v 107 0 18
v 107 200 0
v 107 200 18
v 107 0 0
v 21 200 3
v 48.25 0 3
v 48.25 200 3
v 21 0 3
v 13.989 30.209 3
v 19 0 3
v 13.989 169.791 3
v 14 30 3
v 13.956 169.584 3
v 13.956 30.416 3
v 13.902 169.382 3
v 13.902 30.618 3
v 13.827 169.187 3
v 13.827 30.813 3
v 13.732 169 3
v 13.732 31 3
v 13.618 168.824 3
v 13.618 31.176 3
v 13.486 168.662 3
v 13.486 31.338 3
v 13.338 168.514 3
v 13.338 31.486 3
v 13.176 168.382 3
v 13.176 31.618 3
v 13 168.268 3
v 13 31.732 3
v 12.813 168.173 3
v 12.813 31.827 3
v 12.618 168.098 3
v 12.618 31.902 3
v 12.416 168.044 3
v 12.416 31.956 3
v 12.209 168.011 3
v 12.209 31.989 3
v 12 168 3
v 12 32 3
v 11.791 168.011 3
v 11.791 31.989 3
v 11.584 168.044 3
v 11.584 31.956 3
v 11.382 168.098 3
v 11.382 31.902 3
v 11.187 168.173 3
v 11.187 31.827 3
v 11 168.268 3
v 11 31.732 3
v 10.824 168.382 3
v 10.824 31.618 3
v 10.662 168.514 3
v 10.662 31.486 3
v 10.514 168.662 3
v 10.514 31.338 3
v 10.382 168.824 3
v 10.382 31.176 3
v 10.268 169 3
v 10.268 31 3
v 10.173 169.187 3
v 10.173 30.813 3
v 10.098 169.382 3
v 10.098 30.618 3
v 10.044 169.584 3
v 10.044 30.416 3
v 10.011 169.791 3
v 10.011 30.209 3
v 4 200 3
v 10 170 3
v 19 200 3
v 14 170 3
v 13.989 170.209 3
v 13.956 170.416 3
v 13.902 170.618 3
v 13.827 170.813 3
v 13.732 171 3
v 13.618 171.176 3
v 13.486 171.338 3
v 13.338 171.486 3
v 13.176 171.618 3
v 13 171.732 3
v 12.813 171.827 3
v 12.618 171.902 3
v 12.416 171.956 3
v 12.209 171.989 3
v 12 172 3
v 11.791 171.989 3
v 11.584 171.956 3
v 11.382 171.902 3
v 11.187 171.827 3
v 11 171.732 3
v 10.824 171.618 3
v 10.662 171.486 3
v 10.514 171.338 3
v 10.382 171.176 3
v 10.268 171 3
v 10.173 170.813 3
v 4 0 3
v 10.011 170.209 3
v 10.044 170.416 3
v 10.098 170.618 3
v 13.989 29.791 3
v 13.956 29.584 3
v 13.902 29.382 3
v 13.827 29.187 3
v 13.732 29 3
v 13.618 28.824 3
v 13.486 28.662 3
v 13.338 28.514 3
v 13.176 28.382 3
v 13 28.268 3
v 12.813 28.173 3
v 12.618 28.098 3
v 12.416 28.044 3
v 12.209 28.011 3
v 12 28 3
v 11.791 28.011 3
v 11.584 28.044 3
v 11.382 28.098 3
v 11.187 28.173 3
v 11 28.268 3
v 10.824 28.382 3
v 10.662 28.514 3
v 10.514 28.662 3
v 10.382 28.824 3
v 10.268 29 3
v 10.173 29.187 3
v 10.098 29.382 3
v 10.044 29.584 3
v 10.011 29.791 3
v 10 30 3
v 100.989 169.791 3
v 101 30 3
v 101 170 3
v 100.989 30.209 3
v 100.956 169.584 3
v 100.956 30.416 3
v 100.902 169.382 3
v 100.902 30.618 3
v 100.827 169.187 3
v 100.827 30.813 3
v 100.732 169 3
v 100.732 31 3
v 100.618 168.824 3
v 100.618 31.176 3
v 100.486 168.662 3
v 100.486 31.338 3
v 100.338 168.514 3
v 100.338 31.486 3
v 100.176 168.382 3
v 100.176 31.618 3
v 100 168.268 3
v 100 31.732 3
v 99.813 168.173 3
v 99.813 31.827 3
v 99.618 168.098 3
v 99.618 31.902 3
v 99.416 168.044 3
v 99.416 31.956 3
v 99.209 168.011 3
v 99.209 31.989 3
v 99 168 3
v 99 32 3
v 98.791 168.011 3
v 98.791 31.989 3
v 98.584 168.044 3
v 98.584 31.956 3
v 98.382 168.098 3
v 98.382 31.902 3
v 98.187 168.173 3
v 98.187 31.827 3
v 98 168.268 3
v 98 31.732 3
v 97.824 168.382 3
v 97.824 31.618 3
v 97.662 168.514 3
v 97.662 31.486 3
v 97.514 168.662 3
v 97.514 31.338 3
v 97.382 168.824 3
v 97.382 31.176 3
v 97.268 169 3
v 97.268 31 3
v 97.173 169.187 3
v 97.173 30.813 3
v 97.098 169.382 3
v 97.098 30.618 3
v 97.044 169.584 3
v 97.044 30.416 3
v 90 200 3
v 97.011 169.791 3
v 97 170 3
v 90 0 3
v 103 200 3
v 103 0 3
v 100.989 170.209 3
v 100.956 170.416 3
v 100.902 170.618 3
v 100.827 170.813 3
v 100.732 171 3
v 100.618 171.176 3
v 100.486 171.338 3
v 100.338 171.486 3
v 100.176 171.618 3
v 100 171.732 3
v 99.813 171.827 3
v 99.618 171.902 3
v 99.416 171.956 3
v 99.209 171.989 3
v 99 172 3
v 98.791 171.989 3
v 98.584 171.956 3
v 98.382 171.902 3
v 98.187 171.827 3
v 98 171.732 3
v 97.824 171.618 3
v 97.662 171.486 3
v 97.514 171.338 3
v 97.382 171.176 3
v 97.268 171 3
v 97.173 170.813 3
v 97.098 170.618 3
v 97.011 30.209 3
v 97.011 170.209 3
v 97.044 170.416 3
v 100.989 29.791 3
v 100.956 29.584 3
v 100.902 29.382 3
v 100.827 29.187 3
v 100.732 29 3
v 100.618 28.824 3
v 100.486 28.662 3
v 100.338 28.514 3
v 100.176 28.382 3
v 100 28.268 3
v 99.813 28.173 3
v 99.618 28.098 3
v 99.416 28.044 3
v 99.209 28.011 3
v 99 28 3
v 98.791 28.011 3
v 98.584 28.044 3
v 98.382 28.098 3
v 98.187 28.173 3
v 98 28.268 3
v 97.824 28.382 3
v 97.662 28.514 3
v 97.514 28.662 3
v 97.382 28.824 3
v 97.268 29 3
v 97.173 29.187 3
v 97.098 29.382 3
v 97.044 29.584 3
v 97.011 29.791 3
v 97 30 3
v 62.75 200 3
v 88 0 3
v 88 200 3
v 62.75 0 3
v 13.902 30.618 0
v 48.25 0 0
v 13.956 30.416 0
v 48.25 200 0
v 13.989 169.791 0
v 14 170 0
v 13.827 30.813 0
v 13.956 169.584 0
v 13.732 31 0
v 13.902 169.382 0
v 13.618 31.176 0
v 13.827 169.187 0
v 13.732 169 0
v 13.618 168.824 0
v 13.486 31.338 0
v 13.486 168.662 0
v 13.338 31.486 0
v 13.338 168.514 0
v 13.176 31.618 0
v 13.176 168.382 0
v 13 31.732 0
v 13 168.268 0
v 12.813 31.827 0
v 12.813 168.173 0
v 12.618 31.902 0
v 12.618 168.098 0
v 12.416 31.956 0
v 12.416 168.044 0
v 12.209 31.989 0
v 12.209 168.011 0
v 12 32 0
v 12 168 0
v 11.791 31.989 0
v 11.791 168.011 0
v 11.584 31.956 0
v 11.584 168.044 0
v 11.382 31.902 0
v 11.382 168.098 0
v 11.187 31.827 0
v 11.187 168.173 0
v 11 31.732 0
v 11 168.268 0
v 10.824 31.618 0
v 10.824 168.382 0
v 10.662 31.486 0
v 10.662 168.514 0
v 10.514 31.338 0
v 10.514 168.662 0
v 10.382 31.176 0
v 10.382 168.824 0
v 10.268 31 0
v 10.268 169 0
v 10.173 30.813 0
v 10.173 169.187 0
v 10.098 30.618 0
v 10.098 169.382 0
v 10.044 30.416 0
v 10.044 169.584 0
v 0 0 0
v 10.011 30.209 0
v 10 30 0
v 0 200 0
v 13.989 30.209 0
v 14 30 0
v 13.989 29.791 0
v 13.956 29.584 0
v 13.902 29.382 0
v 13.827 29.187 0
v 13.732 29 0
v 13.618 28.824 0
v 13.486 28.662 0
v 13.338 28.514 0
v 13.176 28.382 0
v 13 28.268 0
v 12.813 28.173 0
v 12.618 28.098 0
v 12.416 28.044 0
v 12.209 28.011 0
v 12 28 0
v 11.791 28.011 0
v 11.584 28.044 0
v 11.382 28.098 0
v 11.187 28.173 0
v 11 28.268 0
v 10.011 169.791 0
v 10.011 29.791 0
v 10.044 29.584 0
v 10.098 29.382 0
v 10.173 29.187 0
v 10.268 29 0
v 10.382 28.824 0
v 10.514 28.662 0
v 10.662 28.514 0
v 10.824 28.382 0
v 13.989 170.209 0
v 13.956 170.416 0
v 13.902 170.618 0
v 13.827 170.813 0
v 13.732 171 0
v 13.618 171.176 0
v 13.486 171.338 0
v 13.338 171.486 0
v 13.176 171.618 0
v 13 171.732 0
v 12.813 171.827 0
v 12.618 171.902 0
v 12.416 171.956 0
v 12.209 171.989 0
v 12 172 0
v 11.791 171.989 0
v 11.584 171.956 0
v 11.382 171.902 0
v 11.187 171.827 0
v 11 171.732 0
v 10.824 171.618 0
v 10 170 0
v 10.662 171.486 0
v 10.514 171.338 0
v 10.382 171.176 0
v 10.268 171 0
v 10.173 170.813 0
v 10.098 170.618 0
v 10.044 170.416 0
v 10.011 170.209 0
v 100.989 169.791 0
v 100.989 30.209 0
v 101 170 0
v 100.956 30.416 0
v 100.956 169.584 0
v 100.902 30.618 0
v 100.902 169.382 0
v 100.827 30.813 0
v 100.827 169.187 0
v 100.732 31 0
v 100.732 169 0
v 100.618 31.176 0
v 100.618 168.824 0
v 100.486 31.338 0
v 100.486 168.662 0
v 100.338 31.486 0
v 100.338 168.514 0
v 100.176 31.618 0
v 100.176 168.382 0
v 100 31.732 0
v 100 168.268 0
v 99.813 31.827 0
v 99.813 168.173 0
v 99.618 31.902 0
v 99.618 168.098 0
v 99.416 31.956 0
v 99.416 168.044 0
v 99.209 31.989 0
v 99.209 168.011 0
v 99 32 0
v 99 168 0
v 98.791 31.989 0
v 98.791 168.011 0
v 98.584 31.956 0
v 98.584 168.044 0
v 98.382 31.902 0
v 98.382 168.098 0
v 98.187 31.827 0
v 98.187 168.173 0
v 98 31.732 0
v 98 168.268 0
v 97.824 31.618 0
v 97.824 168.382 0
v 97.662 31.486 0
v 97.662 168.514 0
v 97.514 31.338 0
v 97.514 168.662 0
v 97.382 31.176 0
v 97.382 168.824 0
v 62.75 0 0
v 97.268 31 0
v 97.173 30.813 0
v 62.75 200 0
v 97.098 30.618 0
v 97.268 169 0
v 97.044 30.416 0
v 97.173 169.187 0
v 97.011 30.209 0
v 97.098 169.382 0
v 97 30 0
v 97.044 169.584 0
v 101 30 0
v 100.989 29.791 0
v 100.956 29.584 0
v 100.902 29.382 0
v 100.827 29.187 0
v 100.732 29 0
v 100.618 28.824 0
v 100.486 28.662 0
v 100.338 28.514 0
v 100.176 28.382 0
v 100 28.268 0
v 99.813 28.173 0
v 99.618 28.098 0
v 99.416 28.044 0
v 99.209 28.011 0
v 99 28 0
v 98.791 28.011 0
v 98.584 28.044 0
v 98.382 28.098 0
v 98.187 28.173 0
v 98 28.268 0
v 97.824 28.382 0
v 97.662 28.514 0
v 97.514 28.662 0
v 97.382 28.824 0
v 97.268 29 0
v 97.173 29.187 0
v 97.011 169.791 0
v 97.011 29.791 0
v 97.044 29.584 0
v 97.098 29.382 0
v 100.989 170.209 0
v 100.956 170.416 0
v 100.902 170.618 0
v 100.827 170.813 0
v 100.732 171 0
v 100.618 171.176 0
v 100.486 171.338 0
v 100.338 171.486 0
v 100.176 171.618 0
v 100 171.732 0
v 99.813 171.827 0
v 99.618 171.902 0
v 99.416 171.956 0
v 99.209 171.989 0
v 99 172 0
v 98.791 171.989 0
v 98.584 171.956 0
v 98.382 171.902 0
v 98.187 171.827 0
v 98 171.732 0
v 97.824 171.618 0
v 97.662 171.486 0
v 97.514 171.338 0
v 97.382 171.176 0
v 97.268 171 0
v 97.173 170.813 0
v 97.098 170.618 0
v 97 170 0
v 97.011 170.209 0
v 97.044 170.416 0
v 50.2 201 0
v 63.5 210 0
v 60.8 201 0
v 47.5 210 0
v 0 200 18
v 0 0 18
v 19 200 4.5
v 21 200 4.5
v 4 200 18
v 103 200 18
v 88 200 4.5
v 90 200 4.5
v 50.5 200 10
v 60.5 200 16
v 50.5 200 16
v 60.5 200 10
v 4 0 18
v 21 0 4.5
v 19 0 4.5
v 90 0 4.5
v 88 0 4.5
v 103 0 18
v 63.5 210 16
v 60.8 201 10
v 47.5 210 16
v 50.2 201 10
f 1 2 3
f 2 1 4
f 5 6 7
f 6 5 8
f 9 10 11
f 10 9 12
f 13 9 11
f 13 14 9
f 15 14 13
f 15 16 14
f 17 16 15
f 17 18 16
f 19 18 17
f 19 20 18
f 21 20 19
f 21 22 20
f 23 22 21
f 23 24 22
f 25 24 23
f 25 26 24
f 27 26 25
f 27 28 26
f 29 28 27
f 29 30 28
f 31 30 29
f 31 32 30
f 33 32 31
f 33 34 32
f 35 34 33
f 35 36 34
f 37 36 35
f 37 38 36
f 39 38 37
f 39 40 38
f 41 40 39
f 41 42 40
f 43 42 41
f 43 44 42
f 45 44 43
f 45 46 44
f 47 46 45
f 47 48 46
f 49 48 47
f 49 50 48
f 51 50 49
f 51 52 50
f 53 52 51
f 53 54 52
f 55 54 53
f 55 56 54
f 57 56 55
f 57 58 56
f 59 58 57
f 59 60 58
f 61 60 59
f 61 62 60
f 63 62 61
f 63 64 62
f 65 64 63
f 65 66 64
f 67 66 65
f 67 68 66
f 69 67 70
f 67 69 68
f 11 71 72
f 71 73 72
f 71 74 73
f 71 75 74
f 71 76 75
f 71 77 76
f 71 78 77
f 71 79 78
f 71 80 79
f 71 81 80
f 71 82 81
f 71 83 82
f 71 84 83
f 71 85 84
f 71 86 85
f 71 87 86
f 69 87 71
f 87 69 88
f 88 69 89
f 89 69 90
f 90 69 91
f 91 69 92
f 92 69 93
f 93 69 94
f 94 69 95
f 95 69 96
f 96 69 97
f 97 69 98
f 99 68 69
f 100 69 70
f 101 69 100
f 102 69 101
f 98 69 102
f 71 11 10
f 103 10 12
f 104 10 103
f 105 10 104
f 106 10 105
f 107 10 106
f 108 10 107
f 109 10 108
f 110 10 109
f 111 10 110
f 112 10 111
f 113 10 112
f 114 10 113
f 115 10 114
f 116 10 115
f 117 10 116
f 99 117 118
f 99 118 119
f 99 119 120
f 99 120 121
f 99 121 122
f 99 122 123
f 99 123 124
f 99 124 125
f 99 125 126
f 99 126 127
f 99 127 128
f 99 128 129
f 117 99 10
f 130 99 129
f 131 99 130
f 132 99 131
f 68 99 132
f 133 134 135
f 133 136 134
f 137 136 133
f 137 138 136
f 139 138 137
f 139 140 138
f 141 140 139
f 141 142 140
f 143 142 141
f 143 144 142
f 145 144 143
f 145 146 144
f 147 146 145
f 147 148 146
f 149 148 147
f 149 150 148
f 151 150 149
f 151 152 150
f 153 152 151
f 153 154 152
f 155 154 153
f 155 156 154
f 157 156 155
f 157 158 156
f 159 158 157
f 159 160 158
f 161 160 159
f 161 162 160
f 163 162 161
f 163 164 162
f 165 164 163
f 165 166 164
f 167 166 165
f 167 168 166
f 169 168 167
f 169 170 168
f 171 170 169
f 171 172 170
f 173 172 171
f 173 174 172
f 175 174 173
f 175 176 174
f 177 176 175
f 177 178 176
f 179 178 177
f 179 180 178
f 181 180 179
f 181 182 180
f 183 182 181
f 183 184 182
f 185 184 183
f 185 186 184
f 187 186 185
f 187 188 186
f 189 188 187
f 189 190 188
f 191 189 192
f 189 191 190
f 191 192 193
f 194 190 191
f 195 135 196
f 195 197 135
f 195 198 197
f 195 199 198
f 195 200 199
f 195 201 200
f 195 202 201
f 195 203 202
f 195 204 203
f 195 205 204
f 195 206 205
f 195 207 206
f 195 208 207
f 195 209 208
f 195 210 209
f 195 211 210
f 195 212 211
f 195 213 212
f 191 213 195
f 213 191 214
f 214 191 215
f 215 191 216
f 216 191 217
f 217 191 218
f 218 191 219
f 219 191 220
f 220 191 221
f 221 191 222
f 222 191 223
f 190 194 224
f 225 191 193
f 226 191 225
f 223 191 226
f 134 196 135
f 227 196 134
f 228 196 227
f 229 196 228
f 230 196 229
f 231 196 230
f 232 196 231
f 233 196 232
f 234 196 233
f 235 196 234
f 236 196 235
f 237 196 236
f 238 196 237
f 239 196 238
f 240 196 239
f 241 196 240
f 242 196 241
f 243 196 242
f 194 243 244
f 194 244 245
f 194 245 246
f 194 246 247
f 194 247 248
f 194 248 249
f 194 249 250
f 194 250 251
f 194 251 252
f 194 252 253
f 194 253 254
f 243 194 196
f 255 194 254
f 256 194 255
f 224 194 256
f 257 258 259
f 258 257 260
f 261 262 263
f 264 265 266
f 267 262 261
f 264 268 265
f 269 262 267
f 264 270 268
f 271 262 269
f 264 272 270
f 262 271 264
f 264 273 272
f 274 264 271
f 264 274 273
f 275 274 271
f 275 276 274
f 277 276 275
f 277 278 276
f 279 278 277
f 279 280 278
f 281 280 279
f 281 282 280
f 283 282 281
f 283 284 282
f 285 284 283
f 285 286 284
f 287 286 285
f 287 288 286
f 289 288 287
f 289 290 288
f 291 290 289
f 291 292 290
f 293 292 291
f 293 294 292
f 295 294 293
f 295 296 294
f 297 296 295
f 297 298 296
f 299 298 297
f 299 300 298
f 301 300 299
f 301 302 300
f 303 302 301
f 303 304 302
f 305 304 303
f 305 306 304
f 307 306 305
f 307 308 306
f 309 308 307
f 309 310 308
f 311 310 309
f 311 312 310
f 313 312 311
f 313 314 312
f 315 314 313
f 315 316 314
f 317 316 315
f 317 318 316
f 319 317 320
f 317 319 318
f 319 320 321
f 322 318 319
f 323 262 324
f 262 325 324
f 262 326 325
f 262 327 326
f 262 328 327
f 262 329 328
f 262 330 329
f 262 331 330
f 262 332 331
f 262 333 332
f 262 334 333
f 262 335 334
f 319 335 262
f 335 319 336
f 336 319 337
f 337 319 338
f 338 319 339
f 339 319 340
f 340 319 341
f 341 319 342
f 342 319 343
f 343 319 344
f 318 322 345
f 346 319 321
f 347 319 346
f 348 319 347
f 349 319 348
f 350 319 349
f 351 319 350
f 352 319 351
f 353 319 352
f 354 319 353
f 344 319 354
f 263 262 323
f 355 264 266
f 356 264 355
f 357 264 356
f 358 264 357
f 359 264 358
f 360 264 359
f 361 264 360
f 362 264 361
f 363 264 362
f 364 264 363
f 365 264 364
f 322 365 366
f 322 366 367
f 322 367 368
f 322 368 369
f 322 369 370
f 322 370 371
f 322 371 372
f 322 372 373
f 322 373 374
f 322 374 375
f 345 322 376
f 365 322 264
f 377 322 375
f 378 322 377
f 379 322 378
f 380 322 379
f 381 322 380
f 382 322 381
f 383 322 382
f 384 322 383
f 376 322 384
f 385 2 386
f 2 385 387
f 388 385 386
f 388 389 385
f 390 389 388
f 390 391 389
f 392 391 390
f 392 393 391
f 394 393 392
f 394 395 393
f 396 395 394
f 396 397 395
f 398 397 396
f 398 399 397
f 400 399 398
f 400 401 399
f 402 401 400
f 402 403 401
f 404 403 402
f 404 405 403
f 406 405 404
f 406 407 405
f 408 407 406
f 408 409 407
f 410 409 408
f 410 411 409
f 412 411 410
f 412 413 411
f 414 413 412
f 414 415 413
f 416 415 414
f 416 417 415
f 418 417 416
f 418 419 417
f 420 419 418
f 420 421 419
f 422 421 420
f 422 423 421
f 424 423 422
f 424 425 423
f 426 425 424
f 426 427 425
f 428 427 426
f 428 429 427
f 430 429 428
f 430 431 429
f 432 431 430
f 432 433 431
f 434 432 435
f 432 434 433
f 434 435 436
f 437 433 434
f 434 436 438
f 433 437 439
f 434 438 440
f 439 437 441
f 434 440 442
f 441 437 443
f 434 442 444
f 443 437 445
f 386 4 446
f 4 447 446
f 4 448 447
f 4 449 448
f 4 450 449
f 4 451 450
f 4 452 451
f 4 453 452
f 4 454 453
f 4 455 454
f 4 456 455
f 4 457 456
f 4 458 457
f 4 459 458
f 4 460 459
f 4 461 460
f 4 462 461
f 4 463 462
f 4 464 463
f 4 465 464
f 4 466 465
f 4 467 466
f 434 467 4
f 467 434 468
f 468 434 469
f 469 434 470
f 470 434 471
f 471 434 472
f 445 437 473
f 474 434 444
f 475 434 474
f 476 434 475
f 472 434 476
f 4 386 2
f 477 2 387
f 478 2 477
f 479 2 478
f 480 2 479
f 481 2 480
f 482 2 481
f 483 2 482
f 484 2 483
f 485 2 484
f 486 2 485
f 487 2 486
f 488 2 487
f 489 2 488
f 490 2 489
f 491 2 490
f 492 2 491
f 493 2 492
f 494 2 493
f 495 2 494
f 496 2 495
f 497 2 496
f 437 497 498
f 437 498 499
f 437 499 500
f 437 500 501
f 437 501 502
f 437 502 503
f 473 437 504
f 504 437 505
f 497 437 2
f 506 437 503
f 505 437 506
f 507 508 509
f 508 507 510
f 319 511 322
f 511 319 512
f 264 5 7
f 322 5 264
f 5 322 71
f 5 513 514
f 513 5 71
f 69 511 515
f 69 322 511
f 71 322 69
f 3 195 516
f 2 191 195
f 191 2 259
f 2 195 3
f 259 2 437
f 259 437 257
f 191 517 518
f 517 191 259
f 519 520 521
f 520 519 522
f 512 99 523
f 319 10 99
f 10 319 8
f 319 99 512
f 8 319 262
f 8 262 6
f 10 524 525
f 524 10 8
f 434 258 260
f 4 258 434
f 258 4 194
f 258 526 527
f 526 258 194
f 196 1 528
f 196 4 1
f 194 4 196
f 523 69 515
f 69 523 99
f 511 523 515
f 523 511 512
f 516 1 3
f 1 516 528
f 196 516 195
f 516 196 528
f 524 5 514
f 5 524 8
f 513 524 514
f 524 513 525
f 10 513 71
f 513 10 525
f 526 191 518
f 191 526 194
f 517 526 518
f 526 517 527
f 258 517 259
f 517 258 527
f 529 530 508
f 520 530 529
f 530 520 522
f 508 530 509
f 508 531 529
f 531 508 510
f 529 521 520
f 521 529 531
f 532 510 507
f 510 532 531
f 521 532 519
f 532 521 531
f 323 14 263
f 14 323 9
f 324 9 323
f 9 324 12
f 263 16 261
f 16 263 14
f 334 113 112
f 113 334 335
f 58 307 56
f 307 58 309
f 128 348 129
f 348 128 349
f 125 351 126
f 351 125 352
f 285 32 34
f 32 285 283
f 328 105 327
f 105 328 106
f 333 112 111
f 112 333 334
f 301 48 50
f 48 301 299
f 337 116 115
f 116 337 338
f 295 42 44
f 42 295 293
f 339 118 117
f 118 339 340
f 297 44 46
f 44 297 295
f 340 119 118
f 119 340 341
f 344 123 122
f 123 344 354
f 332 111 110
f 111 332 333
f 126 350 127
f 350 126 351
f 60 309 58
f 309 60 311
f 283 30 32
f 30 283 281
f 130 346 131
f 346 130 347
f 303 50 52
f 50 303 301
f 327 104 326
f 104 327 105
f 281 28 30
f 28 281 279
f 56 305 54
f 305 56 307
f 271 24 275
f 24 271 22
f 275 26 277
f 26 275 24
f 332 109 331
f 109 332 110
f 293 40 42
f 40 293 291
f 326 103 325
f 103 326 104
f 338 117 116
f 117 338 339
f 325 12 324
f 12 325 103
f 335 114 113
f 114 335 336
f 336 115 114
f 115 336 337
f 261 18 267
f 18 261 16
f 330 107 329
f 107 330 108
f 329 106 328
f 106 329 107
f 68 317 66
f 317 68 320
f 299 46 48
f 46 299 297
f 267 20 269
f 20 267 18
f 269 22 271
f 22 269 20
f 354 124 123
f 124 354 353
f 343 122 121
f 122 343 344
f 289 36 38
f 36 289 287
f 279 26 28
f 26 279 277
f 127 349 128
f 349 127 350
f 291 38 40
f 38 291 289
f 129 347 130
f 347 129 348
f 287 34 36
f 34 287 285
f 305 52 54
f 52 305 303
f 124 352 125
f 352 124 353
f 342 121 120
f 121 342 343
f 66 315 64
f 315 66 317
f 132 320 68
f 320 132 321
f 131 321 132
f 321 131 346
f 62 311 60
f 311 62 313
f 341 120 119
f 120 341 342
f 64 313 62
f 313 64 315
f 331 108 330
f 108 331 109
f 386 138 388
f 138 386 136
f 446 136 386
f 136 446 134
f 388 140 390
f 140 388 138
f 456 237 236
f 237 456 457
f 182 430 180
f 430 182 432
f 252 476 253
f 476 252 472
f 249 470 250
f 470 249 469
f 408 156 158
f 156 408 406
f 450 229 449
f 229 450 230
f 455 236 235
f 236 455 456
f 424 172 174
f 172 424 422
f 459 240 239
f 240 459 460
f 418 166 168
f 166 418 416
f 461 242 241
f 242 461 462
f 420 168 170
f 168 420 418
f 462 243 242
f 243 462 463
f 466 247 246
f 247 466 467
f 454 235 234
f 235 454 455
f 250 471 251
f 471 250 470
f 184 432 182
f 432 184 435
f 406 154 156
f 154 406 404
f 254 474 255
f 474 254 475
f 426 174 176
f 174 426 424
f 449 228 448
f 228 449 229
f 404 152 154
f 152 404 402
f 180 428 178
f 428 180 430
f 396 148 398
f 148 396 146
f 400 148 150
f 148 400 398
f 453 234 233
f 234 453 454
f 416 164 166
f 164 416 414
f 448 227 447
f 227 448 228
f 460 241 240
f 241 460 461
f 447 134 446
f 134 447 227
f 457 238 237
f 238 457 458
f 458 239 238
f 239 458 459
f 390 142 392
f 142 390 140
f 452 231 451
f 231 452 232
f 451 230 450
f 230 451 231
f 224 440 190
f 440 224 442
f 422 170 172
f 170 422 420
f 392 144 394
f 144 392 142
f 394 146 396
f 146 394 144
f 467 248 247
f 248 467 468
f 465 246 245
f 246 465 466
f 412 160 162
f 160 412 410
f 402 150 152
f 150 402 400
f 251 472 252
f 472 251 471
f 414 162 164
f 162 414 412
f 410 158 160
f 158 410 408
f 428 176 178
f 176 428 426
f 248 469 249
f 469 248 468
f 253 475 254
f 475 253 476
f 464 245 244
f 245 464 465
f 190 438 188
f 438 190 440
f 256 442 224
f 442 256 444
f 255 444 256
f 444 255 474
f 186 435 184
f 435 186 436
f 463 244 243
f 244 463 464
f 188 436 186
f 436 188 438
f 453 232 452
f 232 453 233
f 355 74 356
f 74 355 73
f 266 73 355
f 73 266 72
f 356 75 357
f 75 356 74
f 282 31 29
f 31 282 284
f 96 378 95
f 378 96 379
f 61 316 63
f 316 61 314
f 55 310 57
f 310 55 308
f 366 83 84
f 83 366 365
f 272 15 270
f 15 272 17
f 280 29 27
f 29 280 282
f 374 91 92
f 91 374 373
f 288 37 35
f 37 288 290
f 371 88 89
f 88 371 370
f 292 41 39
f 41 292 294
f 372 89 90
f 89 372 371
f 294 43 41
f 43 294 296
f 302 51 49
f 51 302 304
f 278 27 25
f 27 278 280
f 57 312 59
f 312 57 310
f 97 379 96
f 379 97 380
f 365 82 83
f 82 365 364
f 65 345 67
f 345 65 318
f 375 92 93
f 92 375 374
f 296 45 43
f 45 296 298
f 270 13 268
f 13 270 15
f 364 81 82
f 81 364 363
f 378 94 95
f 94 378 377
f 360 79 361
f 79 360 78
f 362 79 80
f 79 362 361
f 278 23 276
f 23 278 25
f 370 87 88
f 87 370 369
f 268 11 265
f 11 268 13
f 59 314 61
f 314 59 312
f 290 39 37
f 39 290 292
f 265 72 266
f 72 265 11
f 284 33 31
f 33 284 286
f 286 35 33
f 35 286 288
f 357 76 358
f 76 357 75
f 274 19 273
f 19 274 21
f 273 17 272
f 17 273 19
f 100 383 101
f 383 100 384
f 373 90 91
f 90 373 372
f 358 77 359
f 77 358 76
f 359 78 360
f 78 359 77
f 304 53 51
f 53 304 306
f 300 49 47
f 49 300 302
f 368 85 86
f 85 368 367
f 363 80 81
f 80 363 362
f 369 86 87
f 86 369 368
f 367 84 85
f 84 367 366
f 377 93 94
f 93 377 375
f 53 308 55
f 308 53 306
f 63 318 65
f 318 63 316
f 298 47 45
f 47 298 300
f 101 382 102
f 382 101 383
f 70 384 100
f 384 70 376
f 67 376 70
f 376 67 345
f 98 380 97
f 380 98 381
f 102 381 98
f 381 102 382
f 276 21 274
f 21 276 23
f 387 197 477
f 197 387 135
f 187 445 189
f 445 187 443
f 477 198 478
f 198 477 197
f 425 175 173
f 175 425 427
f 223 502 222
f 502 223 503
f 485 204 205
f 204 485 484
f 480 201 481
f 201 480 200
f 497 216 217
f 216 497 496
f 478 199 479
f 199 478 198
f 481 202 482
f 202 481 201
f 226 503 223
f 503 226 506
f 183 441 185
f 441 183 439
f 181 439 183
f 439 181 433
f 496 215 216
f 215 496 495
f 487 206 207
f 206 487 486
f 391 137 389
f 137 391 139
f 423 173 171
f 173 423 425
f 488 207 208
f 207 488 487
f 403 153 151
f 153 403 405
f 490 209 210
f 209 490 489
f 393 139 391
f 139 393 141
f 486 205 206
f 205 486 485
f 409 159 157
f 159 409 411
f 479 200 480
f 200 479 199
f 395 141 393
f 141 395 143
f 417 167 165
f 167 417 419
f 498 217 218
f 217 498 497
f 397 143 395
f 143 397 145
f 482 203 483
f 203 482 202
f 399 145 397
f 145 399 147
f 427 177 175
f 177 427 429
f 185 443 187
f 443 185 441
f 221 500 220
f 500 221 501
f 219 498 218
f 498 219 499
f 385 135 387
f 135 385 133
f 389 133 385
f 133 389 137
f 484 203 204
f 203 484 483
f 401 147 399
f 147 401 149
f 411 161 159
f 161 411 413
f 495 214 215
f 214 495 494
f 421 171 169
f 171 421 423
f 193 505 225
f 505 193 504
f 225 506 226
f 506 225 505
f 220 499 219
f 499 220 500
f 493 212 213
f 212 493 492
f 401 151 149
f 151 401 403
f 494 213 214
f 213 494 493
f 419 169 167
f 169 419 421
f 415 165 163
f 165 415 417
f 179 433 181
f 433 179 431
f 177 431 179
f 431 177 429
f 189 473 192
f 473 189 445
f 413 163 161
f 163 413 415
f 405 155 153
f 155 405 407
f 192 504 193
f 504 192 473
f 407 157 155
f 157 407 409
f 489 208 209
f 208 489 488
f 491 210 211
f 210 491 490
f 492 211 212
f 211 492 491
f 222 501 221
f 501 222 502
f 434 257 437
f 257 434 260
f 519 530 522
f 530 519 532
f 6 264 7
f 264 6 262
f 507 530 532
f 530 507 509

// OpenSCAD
// ====================================================================
// SUSHI CONVEYOR - MODULAR STRAIGHT TRACK SEGMENT
// Designed for Prusa CORE One+ (Fits 250x220mm Bed Flat Without Supports)
//
// Features:
// - Two low-friction sliding rails to minimize motor strain.
// - Center hinge guide slot (14mm wide).
// - Interlocking dovetail ends for snap-together tool-less assembly.
// - Split-lane side joints with central utility channel (for LEDs/wires).
// ====================================================================

$fn = 60;

// --------------------------------------------------
// TRACK PARAMETERS
// --------------------------------------------------
segment_length = 200.0; // 200mm length fits standard bed
slat_width     = 100.0; // Slat width
lane_clearance = 3.0;   // 1.5mm gap on each side
channel_width  = slat_width + lane_clearance; // 103mm

track_base_th  = 3.0;   // Floor thickness
side_wall_th   = 4.0;   // Outer wall thickness
side_wall_h    = 18.0;  // Outer guard wall height
slot_width     = 14.5;  // Center slot width for hinge lugs
slot_depth     = 11.0;  // Center slot depth

dovetail_w     = 16.0;  // Interlocking dovetail width
dovetail_neck  = 10.0;  // Dovetail neck width
dovetail_h     = 10.0;  // Dovetail length
dovetail_clr   = 0.25;  // 0.25mm slip-fit clearance for 3D printing

// --------------------------------------------------
// DOVETAIL TAB MODULE
// --------------------------------------------------
module dovetail_tab(clr = 0.0) {
    linear_extrude(height = side_wall_h - 2) {
        polygon(points=[
            [-dovetail_neck/2 + clr, 0],
            [-dovetail_w/2 + clr, dovetail_h - clr],
            [dovetail_w/2 - clr, dovetail_h - clr],
            [dovetail_neck/2 - clr, 0]
        ]);
    }
}

// --------------------------------------------------
// SINGLE STRAIGHT LANE MODULE (LEFT OR RIGHT)
// --------------------------------------------------
module straight_lane_half(is_left = true) {
    difference() {
        union() {
            // Main floor and outer wall body
            cube([channel_width + side_wall_th, segment_length, track_base_th]);
            
            // Outer guide wall
            translate([0, 0, 0])
                cube([side_wall_th, segment_length, side_wall_h]);
            
            // Inner guide wall (dividing island edge)
            translate([channel_width, 0, 0])
                cube([side_wall_th, segment_length, side_wall_h]);
            
            // Raised low-friction glide ribs (Slats ride on these two thin ridges)
            translate([side_wall_th + 15, 0, track_base_th])
                cube([2.0, segment_length, 1.5]);
            translate([channel_width - 15, 0, track_base_th])
                cube([2.0, segment_length, 1.5]);
            
            // Male Dovetail Interlock Tab at the end (+Y)
            translate([side_wall_th + channel_width/2, segment_length, 0])
                dovetail_tab(clr = 0.0);
        }
        
        // --- SUBTRACTIONS ---
        
        // 1. Center Hinge Guide Channel
        translate([side_wall_th + channel_width/2 - slot_width/2, -1, -1])
            cube([slot_width, segment_length + 2, slot_depth]);
        
        // 2. Female Dovetail Socket at start (Y = 0)
        translate([side_wall_th + channel_width/2, 0, -0.1])
            mirror([0, 1, 0])
                dovetail_tab(clr = -dovetail_clr);
        
        // 3. Screw mounting / table grip foot counter-bores (optional)
        for (y = [30, segment_length - 30]) {
            translate([side_wall_th + 8, y, -0.5])
                cylinder(r = 2.0, h = track_base_th + 2);
            translate([channel_width - 4, y, -0.5])
                cylinder(r = 2.0, h = track_base_th + 2);
        }
    }
}

// Render Left Lane Segment
straight_lane_half(is_left = true);
